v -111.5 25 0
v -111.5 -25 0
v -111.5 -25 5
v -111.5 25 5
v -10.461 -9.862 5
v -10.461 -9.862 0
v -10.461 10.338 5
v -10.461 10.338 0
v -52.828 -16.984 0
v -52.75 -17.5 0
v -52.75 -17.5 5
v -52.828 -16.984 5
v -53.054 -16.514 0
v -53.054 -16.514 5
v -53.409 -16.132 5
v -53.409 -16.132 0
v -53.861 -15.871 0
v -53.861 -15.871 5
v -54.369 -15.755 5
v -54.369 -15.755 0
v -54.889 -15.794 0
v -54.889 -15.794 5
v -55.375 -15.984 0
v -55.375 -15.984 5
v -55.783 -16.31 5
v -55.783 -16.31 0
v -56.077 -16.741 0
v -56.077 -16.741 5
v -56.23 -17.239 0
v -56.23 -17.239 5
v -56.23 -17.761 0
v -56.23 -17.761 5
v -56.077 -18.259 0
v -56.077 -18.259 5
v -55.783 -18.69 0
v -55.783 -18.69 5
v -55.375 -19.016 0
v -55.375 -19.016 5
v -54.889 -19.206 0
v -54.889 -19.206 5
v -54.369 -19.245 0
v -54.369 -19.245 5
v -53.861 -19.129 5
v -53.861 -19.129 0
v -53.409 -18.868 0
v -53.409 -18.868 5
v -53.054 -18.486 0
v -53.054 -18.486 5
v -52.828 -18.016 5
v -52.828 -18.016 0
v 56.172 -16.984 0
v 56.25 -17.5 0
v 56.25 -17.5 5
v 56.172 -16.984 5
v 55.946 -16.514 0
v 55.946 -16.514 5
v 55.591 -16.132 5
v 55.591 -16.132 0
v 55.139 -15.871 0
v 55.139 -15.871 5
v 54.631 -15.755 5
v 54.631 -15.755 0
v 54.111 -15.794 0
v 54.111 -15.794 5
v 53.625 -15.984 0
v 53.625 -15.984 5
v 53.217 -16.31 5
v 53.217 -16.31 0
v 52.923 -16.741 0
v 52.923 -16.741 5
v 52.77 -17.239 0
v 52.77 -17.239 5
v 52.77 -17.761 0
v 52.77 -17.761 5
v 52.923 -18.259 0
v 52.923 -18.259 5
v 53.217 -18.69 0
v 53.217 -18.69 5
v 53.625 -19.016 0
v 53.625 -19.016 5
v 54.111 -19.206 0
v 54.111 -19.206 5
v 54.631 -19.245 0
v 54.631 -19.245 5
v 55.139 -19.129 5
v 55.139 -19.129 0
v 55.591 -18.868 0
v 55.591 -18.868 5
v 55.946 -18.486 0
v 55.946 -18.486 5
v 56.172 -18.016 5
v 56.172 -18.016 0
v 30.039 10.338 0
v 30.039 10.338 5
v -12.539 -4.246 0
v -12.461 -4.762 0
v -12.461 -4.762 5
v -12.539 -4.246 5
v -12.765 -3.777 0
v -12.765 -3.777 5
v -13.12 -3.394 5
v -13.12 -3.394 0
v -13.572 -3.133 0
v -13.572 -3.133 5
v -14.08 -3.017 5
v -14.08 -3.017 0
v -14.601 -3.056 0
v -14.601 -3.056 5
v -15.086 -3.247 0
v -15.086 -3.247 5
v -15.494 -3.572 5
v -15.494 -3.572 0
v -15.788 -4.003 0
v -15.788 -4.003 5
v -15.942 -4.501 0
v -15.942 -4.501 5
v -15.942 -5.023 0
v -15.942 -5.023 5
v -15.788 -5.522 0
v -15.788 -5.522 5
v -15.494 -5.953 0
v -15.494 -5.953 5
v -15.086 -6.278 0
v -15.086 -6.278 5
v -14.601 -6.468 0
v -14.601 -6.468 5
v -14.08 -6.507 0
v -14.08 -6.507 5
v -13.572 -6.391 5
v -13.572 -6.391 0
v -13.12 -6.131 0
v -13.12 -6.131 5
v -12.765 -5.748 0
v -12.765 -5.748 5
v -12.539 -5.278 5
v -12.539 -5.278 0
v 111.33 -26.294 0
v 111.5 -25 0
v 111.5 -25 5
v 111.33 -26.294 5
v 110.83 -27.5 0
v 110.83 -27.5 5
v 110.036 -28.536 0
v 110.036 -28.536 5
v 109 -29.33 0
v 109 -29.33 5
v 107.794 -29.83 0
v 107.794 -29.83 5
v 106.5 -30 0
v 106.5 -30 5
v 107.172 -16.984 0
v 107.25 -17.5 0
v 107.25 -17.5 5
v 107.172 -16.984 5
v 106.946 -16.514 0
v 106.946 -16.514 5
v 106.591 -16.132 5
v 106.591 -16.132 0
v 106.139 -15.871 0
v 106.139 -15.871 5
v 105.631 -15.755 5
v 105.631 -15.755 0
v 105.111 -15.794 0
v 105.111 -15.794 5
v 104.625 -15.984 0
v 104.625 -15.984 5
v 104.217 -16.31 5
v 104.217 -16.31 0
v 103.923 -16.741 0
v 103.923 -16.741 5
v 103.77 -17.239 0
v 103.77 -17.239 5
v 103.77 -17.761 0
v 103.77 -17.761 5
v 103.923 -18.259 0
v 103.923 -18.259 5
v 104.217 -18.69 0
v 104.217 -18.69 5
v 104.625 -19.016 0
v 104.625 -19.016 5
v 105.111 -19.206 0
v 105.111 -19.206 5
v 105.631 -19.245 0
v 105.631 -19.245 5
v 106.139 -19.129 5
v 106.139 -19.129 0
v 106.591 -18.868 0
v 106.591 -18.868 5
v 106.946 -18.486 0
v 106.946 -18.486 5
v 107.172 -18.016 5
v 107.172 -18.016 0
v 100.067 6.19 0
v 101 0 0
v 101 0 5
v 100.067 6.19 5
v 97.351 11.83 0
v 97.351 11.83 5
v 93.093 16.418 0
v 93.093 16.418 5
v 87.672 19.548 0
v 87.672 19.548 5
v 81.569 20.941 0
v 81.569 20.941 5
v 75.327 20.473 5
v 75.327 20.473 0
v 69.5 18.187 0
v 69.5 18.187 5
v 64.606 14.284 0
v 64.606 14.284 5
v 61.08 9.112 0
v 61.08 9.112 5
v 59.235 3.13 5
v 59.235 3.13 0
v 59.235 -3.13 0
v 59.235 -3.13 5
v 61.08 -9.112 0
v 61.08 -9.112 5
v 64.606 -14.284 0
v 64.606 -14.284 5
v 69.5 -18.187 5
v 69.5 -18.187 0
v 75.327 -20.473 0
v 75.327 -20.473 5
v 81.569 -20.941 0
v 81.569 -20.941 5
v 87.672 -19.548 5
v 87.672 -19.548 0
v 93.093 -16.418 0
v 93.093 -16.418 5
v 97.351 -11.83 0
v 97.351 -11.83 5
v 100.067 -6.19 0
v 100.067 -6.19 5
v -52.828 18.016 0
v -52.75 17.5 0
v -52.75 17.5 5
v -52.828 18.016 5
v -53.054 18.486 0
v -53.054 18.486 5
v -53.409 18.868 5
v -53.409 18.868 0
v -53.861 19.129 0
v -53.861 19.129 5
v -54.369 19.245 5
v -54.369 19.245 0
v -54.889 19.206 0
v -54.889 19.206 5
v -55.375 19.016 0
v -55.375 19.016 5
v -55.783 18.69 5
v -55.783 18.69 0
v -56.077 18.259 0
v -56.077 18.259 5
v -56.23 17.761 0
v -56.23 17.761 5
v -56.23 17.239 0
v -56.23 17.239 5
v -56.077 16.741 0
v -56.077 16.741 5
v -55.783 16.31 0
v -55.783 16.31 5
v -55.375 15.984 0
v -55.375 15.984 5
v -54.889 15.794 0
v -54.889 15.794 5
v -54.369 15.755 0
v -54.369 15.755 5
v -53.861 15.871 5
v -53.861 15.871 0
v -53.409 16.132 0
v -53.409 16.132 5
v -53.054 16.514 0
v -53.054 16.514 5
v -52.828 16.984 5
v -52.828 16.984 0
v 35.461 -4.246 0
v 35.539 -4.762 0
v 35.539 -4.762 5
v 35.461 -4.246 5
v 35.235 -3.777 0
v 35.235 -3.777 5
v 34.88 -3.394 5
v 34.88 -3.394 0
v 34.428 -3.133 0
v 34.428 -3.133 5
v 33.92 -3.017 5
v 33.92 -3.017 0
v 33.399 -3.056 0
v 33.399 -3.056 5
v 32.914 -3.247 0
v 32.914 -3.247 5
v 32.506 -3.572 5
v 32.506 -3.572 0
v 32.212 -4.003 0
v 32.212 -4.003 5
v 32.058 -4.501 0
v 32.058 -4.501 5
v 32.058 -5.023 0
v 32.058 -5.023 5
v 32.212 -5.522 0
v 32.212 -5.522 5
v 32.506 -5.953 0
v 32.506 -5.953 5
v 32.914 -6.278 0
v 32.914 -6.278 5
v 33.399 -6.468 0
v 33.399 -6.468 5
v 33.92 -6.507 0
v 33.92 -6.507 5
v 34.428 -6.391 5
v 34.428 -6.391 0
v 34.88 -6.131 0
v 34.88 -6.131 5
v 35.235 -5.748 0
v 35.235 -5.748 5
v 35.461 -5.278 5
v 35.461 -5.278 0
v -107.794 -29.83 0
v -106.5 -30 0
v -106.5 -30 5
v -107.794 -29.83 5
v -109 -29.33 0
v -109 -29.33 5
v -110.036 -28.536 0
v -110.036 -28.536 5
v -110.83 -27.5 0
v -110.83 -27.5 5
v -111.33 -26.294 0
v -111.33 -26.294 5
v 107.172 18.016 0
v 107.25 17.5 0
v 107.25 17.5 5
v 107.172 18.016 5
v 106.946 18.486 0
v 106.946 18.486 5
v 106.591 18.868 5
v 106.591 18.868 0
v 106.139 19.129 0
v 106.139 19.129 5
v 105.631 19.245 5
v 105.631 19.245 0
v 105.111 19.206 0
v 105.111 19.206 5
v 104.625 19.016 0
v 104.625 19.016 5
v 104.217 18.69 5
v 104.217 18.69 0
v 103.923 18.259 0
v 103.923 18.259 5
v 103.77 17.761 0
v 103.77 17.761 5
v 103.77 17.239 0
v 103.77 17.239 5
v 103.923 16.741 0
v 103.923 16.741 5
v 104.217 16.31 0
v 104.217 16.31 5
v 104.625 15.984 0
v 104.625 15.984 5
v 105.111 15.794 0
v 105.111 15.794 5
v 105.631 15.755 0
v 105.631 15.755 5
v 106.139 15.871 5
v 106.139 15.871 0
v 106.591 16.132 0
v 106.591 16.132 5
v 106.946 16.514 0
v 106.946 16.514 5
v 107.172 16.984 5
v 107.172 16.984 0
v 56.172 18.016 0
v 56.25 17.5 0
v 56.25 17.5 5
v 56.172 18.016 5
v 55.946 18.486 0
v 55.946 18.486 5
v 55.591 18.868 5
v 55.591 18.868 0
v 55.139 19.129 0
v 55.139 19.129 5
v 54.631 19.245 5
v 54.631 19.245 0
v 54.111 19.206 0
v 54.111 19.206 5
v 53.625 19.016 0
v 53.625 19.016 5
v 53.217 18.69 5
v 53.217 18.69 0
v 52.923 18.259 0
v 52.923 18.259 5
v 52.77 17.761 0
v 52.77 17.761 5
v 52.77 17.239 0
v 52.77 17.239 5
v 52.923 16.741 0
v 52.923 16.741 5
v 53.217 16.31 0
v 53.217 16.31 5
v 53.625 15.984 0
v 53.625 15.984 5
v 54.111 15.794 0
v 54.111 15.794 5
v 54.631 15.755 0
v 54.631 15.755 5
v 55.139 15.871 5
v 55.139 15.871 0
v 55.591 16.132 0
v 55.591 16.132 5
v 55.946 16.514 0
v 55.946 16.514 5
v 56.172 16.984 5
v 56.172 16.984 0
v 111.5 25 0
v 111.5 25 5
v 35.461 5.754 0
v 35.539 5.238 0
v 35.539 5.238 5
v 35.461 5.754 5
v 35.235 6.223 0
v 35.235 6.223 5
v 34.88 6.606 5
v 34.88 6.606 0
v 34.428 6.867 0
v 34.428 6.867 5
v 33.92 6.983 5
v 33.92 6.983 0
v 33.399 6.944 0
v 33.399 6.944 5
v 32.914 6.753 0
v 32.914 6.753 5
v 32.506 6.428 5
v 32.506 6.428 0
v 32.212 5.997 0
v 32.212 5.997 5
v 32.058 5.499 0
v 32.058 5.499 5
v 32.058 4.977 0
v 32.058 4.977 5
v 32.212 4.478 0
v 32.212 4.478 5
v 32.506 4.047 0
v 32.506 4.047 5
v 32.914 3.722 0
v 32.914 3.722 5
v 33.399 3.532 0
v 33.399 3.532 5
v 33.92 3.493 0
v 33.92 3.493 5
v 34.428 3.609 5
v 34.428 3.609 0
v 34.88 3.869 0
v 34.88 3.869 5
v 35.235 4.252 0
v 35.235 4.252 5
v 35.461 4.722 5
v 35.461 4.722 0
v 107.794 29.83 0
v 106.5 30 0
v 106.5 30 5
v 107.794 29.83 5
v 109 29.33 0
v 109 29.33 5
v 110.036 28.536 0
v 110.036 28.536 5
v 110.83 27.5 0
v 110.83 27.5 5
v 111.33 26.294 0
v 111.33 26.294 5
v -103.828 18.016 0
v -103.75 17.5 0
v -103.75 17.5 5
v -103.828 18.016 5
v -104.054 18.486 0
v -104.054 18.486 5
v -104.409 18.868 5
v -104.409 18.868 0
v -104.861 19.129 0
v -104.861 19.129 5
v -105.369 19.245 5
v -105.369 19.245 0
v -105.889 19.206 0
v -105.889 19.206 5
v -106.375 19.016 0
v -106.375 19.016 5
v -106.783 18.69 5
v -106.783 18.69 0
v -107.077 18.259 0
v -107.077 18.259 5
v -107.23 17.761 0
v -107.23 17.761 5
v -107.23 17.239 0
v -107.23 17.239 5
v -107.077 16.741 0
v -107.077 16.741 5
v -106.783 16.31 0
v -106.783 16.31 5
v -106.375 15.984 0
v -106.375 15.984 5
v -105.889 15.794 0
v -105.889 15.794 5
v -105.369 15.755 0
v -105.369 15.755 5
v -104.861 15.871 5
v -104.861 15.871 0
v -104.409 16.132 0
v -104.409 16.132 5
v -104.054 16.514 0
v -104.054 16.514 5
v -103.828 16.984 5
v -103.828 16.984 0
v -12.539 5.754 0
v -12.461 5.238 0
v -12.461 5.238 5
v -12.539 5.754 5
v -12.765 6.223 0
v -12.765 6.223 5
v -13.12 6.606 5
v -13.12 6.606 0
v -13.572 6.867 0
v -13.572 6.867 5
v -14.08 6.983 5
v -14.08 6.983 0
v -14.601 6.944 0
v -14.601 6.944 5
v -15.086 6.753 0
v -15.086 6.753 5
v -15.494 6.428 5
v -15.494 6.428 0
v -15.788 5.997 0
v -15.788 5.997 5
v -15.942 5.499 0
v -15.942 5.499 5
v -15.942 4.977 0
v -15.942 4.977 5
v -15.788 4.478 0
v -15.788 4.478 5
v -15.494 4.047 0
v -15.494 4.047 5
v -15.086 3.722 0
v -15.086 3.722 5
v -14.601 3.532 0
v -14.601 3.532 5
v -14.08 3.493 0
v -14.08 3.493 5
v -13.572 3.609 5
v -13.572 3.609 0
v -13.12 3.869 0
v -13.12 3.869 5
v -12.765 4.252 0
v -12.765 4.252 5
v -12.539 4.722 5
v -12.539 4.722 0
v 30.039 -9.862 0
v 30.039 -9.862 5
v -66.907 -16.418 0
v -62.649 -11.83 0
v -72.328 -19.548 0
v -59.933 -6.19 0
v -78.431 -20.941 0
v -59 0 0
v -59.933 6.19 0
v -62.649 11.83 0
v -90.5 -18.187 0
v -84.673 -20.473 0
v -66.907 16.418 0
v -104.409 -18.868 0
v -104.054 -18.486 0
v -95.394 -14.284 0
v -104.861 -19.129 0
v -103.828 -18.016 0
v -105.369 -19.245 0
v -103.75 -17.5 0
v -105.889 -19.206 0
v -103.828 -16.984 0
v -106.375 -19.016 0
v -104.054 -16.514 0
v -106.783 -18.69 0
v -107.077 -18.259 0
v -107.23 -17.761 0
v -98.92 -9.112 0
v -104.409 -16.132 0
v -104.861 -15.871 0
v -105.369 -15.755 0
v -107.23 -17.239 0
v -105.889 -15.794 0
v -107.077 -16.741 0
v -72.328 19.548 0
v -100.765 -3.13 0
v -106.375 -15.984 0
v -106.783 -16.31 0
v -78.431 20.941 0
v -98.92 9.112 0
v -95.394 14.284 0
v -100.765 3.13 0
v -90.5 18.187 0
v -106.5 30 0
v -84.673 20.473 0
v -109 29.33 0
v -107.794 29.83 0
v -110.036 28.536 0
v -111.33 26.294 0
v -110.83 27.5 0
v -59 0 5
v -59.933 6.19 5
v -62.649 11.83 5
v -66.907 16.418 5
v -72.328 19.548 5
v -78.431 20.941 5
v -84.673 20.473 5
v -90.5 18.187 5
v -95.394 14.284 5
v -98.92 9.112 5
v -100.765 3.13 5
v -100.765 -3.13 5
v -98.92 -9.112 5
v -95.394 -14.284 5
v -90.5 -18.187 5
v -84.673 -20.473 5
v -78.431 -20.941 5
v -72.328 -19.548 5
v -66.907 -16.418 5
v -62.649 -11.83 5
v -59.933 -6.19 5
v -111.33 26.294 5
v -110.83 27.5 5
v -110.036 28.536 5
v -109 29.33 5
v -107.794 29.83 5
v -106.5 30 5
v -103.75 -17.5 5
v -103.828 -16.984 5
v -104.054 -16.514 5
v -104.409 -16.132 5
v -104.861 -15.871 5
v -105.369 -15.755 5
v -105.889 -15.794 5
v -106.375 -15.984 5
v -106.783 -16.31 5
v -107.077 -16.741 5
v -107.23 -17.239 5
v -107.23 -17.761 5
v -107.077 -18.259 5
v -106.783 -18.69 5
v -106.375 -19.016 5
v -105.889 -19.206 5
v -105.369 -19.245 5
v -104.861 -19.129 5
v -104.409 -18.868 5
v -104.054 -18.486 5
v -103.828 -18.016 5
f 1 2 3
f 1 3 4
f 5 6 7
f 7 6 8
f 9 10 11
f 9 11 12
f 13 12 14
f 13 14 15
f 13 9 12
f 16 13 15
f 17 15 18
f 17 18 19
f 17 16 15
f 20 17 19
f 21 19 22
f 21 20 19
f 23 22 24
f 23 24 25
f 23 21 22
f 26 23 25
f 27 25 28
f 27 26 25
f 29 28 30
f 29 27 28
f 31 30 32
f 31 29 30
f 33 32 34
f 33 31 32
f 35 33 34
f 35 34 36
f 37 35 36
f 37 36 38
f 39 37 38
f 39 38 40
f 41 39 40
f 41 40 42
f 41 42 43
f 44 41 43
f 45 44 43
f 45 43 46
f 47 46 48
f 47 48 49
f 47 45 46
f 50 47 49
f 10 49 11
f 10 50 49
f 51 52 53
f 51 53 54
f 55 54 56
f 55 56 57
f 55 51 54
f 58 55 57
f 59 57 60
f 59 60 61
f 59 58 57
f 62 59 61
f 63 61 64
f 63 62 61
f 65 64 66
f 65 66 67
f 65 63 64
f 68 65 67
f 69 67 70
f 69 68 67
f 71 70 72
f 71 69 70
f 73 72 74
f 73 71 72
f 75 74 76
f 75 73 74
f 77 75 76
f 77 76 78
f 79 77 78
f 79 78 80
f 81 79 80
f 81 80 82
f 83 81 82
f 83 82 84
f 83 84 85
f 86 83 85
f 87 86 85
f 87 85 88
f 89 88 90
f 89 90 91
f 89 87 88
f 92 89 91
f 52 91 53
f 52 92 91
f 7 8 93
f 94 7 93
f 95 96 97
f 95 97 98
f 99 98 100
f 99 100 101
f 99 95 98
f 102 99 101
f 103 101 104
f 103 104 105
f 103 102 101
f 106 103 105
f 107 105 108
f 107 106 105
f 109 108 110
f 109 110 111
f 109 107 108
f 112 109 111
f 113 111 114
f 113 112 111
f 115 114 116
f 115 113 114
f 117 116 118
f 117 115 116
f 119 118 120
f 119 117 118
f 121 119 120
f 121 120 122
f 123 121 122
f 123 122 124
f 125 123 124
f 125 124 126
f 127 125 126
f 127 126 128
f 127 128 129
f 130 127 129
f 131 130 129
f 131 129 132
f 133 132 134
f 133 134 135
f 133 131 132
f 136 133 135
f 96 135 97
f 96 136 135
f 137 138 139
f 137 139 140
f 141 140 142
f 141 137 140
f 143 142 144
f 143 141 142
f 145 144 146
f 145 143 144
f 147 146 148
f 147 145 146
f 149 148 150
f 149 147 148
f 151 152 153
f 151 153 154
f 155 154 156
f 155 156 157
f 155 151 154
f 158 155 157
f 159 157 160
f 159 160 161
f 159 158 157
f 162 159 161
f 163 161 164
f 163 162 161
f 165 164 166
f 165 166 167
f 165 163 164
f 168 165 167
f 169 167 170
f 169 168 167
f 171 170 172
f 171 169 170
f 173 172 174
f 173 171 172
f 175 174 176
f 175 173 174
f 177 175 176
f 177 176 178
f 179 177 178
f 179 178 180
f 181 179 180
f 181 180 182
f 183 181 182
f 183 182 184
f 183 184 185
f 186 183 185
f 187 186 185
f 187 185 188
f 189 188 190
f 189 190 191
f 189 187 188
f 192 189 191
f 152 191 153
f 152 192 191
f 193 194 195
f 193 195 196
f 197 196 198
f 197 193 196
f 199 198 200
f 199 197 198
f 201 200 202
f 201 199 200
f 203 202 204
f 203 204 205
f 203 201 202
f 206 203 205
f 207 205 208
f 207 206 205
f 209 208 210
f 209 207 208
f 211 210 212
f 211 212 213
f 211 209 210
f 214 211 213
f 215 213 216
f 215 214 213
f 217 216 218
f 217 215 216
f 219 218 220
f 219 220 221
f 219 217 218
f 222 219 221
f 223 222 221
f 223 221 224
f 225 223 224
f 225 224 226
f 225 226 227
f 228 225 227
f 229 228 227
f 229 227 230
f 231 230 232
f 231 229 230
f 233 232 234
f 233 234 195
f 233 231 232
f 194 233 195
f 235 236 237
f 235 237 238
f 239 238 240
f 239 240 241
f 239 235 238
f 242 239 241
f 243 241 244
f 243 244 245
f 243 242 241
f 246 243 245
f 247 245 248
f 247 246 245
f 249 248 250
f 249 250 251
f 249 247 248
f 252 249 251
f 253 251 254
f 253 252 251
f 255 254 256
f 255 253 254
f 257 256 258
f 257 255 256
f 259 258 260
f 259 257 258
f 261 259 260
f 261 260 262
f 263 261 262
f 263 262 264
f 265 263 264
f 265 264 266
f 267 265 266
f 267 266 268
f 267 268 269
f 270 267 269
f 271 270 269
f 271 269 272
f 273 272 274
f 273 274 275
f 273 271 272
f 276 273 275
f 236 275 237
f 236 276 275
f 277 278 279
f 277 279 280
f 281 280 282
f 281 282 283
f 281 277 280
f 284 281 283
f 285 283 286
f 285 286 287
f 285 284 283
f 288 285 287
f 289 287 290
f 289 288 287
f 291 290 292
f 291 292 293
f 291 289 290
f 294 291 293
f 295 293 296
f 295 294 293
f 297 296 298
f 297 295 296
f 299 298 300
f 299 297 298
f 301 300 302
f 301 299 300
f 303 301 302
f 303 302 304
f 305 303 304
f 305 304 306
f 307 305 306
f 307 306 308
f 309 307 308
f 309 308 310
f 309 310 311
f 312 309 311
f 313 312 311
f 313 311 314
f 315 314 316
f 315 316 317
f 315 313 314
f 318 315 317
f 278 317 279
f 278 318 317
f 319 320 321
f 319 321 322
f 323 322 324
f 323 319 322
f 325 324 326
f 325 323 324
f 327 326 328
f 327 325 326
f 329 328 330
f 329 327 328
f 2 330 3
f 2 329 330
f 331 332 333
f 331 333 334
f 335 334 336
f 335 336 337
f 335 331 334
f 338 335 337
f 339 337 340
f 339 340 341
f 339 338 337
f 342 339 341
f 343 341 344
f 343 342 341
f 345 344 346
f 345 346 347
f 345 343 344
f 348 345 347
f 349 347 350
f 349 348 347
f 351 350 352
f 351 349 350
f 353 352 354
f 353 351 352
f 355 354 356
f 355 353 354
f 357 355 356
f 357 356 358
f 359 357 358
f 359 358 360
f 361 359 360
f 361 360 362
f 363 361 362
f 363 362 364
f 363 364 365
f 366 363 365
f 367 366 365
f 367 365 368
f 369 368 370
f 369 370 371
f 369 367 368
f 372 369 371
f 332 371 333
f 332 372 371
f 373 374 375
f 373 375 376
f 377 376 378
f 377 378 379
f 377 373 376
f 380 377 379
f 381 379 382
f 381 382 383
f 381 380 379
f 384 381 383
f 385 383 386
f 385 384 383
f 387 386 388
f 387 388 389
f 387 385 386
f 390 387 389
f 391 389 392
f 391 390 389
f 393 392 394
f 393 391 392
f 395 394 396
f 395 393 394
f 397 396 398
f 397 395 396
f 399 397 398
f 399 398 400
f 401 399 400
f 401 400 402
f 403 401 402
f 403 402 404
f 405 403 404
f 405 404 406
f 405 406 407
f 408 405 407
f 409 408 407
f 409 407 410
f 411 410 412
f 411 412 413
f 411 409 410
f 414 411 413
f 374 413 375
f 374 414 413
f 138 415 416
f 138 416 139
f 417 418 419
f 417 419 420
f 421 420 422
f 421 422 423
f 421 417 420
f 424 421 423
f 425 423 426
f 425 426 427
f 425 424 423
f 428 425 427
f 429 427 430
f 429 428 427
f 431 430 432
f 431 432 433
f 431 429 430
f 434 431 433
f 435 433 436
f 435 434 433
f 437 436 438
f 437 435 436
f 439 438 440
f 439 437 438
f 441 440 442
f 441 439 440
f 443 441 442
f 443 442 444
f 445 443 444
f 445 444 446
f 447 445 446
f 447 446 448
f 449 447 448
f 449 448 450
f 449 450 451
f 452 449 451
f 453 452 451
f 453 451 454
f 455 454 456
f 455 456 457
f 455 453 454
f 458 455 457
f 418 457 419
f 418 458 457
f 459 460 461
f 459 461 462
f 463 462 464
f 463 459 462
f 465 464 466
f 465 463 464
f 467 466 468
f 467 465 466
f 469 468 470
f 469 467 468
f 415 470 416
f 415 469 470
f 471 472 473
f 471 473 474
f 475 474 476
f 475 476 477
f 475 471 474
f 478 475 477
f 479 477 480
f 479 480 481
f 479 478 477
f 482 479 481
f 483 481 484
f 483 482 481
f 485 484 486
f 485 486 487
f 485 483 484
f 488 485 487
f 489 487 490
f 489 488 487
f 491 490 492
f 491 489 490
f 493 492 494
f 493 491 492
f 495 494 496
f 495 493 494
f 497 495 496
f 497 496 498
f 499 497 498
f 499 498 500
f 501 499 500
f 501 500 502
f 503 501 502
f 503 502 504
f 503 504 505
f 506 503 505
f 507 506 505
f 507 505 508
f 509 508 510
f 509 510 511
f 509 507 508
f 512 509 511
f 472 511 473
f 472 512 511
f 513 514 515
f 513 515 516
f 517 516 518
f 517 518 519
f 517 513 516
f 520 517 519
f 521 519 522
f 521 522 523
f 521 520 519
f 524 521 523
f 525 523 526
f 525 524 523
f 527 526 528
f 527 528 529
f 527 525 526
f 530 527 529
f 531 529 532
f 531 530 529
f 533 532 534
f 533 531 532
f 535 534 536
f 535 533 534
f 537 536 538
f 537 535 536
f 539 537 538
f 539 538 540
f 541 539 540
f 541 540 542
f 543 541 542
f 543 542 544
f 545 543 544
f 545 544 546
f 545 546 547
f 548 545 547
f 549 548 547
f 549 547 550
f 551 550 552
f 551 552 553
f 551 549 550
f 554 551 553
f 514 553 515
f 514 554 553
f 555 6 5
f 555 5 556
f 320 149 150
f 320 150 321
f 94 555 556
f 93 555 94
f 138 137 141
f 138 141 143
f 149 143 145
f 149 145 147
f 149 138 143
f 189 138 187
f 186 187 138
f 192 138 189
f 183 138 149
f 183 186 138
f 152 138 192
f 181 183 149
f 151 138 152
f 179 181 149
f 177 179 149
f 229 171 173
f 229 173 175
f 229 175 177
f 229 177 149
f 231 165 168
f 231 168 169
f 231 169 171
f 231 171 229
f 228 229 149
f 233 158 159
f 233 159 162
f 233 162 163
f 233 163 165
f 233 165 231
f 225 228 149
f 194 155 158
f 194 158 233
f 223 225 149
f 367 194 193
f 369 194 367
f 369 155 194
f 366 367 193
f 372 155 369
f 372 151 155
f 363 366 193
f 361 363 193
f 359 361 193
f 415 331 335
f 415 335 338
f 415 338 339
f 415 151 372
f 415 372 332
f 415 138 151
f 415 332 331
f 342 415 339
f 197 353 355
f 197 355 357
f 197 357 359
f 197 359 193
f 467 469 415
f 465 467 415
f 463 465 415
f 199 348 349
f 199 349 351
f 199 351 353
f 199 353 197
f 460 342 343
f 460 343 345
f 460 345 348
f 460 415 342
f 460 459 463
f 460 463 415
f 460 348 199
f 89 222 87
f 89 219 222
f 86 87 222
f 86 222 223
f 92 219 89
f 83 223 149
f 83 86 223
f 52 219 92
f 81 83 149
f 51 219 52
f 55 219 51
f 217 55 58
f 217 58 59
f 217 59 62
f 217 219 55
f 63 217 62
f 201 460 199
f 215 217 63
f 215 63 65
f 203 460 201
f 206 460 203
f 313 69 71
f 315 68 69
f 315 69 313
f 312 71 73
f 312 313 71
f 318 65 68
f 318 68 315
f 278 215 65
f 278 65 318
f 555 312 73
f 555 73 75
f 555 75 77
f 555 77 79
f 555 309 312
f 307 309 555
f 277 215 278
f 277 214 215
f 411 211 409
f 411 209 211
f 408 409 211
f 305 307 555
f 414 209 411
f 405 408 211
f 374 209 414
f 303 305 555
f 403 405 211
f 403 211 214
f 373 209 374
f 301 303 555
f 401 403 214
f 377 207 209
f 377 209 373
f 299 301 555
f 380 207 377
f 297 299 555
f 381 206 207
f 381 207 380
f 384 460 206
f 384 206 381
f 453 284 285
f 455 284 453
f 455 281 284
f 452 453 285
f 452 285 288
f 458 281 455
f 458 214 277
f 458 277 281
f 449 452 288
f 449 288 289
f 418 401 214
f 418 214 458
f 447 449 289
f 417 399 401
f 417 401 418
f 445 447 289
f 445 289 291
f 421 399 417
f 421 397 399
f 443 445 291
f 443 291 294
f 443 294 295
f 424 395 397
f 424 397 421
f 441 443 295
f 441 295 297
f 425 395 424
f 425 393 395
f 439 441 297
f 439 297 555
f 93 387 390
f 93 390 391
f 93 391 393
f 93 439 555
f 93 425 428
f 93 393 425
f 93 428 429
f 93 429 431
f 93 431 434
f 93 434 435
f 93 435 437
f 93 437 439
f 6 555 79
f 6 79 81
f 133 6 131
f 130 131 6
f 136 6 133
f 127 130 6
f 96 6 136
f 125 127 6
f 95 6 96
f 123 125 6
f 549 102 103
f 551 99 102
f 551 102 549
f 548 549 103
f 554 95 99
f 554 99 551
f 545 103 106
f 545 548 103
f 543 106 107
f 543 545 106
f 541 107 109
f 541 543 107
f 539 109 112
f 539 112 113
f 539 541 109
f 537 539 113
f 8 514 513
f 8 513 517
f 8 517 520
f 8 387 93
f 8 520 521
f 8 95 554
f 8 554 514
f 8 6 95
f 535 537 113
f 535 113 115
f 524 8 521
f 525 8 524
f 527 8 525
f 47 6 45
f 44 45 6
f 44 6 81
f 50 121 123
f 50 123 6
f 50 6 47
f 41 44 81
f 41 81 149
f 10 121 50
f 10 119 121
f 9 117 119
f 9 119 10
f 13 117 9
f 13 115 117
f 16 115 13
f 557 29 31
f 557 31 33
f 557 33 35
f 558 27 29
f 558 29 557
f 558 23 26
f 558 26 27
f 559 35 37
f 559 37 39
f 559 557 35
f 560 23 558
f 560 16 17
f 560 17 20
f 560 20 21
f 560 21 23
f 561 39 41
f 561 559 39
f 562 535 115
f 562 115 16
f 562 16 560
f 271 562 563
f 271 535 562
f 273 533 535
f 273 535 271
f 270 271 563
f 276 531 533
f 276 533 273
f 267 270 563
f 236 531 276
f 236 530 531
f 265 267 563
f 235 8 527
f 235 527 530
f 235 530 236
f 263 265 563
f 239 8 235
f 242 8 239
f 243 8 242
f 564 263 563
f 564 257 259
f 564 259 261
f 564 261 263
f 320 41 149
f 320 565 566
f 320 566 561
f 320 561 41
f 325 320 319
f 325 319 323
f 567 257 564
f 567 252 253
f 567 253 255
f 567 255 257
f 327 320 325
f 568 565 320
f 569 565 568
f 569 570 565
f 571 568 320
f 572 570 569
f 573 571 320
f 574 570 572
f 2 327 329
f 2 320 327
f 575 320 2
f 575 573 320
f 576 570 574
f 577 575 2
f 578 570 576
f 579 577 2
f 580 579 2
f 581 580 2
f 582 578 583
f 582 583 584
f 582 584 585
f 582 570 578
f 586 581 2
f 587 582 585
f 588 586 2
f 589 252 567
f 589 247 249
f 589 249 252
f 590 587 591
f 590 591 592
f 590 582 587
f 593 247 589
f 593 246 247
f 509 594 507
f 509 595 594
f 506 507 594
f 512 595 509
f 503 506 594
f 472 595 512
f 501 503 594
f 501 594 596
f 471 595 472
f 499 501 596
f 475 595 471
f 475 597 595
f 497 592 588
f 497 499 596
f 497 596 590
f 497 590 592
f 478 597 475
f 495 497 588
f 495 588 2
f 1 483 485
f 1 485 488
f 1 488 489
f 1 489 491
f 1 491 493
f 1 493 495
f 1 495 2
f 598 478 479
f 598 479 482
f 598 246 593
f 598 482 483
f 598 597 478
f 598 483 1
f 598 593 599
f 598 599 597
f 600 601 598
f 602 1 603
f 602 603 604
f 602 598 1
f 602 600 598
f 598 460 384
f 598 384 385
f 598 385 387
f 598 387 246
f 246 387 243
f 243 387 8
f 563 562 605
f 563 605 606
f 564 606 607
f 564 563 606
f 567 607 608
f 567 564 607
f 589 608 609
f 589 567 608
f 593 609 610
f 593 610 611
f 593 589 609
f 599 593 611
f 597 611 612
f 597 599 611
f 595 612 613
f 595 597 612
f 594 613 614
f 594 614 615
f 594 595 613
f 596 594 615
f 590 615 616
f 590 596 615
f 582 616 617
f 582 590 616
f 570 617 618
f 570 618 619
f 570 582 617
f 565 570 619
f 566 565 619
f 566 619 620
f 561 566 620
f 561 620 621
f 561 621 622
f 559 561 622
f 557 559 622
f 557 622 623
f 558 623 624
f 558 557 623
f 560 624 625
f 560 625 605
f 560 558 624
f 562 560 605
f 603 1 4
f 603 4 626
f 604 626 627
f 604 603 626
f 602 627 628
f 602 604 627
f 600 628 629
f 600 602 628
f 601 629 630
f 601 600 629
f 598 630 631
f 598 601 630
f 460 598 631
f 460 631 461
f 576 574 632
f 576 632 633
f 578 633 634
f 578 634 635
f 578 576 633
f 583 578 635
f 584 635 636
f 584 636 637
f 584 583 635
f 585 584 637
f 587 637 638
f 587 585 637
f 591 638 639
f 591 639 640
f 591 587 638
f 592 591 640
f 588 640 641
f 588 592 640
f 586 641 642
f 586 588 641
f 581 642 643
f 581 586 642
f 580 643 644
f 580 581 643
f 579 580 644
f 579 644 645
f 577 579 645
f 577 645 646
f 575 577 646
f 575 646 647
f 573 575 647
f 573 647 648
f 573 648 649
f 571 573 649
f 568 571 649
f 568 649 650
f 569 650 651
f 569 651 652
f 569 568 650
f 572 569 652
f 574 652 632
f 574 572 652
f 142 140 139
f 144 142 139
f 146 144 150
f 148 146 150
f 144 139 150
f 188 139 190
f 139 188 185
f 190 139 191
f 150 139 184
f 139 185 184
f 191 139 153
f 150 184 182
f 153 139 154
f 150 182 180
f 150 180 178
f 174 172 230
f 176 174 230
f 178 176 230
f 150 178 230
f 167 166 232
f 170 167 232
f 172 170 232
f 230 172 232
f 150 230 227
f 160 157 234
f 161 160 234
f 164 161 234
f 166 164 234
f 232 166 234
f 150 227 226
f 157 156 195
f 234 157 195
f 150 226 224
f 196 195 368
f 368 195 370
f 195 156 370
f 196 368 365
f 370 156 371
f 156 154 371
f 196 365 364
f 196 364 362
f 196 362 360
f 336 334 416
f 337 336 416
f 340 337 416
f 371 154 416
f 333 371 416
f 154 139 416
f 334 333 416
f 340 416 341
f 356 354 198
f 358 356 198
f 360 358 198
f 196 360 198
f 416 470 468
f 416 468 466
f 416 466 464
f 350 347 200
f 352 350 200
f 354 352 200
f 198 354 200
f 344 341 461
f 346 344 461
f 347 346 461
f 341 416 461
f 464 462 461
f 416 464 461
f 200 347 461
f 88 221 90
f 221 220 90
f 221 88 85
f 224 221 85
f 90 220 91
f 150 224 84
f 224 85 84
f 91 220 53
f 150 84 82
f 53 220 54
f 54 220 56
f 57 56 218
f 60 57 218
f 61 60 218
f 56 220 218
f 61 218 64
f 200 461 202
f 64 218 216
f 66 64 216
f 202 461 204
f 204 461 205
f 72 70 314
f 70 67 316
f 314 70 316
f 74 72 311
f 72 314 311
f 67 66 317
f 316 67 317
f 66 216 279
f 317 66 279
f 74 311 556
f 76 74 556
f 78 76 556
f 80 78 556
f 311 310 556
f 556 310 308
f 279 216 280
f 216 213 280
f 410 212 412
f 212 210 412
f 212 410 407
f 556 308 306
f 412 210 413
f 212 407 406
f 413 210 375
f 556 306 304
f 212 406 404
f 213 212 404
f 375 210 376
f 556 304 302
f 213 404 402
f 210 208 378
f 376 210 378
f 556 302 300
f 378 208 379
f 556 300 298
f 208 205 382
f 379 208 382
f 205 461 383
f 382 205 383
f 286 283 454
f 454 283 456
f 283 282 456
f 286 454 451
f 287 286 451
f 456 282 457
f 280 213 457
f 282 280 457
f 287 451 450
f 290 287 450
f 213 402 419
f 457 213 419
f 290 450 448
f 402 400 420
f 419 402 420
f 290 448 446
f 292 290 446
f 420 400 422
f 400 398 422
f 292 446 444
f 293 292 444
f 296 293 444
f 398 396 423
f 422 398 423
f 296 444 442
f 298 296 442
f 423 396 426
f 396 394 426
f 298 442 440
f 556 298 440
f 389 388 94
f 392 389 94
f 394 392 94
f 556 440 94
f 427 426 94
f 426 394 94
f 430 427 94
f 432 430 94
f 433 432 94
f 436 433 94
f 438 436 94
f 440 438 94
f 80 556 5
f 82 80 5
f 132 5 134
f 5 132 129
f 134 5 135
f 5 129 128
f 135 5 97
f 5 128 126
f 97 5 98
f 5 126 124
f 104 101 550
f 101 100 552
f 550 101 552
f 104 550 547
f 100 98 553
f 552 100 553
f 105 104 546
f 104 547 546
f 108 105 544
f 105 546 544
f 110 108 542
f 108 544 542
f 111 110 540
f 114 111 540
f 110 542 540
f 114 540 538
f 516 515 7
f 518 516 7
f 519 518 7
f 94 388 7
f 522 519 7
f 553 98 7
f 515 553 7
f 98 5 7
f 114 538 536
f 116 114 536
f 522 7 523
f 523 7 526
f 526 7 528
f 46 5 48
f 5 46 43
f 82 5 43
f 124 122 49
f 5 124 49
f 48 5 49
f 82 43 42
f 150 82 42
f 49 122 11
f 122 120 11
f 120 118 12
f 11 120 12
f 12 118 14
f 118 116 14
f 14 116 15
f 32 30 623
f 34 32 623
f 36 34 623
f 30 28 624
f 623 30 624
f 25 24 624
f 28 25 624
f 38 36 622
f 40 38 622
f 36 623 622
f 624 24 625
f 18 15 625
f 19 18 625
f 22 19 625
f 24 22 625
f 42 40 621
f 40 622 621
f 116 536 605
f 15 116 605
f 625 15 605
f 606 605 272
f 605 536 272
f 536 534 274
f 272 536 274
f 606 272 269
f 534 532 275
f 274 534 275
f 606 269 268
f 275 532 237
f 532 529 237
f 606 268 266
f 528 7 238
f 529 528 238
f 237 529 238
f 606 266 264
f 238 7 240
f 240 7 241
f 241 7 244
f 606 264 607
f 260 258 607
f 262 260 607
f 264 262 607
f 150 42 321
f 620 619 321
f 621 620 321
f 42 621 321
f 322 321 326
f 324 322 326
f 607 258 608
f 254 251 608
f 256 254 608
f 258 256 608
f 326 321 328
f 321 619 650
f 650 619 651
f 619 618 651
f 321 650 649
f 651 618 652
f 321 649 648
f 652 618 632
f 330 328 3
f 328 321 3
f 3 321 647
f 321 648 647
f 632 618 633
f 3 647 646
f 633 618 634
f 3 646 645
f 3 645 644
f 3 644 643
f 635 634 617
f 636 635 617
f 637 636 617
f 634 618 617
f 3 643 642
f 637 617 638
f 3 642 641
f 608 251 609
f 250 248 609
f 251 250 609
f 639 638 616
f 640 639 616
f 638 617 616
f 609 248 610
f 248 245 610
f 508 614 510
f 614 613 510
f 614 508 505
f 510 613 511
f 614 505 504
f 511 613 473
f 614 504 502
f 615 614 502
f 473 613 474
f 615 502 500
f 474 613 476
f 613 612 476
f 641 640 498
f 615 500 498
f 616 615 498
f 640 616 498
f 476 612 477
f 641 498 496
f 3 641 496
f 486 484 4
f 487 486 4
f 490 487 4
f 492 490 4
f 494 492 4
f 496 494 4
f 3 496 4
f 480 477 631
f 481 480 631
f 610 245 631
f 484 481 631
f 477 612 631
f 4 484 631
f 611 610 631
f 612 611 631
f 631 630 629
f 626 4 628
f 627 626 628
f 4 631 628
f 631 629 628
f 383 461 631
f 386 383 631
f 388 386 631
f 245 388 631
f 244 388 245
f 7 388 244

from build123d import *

# Parameters (mm, degrees)
SKETCH_1_R      = 21
SKETCH_1_R_2    = 1.75
SKETCH_1_W      = 40.5
SKETCH_1_H      = 20.2
EXTRUDE_1_DEPTH = 5


with BuildPart() as part:
    # 草图1 → 凸台-拉伸1 (new body)
    with BuildSketch(Plane.XY):
        with BuildLine():
            Line((106.5, -30), (-106.5, -30))
            ThreePointArc((-106.5, -30), (-110.035533906, -28.535533906), (-111.5, -25))
            Line((-111.5, -25), (-111.5, 25))
            ThreePointArc((-111.5, 25), (-110.035533906, 28.535533906), (-106.5, 30))
            Line((-106.5, 30), (106.5, 30))
            ThreePointArc((106.5, 30), (110.035533906, 28.535533906), (111.5, 25))
            Line((111.5, 25), (111.5, -25))
            ThreePointArc((111.5, -25), (110.035533906, -28.535533906), (106.5, -30))
        make_face()
        with Locations((-80, 0)):
            Circle(SKETCH_1_R, mode=Mode.SUBTRACT)
        with Locations((80, 0)):
            Circle(SKETCH_1_R, mode=Mode.SUBTRACT)
        with Locations((33.788860906, -4.762314657)):
            Circle(SKETCH_1_R_2, mode=Mode.SUBTRACT)
        with Locations((33.788860906, 5.237685343)):
            Circle(SKETCH_1_R_2, mode=Mode.SUBTRACT)
        with Locations((-14.211139094, -4.762314657)):
            Circle(SKETCH_1_R_2, mode=Mode.SUBTRACT)
        with Locations((-14.211139094, 5.237685343)):
            Circle(SKETCH_1_R_2, mode=Mode.SUBTRACT)
        with Locations((-54.5, -17.5)):
            Circle(SKETCH_1_R_2, mode=Mode.SUBTRACT)
        with Locations((-105.5, -17.5)):
            Circle(SKETCH_1_R_2, mode=Mode.SUBTRACT)
        with Locations((-105.5, 17.5)):
            Circle(SKETCH_1_R_2, mode=Mode.SUBTRACT)
        with Locations((-54.5, 17.5)):
            Circle(SKETCH_1_R_2, mode=Mode.SUBTRACT)
        with Locations((54.5, -17.5)):
            Circle(SKETCH_1_R_2, mode=Mode.SUBTRACT)
        with Locations((54.5, 17.5)):
            Circle(SKETCH_1_R_2, mode=Mode.SUBTRACT)
        with Locations((105.5, -17.5)):
            Circle(SKETCH_1_R_2, mode=Mode.SUBTRACT)
        with Locations((105.5, 17.5)):
            Circle(SKETCH_1_R_2, mode=Mode.SUBTRACT)
        with Locations((9.788860906, 0.237685343)):
            Rectangle(SKETCH_1_W, SKETCH_1_H, mode=Mode.SUBTRACT)
    extrude(amount=EXTRUDE_1_DEPTH)


solid = part.part
